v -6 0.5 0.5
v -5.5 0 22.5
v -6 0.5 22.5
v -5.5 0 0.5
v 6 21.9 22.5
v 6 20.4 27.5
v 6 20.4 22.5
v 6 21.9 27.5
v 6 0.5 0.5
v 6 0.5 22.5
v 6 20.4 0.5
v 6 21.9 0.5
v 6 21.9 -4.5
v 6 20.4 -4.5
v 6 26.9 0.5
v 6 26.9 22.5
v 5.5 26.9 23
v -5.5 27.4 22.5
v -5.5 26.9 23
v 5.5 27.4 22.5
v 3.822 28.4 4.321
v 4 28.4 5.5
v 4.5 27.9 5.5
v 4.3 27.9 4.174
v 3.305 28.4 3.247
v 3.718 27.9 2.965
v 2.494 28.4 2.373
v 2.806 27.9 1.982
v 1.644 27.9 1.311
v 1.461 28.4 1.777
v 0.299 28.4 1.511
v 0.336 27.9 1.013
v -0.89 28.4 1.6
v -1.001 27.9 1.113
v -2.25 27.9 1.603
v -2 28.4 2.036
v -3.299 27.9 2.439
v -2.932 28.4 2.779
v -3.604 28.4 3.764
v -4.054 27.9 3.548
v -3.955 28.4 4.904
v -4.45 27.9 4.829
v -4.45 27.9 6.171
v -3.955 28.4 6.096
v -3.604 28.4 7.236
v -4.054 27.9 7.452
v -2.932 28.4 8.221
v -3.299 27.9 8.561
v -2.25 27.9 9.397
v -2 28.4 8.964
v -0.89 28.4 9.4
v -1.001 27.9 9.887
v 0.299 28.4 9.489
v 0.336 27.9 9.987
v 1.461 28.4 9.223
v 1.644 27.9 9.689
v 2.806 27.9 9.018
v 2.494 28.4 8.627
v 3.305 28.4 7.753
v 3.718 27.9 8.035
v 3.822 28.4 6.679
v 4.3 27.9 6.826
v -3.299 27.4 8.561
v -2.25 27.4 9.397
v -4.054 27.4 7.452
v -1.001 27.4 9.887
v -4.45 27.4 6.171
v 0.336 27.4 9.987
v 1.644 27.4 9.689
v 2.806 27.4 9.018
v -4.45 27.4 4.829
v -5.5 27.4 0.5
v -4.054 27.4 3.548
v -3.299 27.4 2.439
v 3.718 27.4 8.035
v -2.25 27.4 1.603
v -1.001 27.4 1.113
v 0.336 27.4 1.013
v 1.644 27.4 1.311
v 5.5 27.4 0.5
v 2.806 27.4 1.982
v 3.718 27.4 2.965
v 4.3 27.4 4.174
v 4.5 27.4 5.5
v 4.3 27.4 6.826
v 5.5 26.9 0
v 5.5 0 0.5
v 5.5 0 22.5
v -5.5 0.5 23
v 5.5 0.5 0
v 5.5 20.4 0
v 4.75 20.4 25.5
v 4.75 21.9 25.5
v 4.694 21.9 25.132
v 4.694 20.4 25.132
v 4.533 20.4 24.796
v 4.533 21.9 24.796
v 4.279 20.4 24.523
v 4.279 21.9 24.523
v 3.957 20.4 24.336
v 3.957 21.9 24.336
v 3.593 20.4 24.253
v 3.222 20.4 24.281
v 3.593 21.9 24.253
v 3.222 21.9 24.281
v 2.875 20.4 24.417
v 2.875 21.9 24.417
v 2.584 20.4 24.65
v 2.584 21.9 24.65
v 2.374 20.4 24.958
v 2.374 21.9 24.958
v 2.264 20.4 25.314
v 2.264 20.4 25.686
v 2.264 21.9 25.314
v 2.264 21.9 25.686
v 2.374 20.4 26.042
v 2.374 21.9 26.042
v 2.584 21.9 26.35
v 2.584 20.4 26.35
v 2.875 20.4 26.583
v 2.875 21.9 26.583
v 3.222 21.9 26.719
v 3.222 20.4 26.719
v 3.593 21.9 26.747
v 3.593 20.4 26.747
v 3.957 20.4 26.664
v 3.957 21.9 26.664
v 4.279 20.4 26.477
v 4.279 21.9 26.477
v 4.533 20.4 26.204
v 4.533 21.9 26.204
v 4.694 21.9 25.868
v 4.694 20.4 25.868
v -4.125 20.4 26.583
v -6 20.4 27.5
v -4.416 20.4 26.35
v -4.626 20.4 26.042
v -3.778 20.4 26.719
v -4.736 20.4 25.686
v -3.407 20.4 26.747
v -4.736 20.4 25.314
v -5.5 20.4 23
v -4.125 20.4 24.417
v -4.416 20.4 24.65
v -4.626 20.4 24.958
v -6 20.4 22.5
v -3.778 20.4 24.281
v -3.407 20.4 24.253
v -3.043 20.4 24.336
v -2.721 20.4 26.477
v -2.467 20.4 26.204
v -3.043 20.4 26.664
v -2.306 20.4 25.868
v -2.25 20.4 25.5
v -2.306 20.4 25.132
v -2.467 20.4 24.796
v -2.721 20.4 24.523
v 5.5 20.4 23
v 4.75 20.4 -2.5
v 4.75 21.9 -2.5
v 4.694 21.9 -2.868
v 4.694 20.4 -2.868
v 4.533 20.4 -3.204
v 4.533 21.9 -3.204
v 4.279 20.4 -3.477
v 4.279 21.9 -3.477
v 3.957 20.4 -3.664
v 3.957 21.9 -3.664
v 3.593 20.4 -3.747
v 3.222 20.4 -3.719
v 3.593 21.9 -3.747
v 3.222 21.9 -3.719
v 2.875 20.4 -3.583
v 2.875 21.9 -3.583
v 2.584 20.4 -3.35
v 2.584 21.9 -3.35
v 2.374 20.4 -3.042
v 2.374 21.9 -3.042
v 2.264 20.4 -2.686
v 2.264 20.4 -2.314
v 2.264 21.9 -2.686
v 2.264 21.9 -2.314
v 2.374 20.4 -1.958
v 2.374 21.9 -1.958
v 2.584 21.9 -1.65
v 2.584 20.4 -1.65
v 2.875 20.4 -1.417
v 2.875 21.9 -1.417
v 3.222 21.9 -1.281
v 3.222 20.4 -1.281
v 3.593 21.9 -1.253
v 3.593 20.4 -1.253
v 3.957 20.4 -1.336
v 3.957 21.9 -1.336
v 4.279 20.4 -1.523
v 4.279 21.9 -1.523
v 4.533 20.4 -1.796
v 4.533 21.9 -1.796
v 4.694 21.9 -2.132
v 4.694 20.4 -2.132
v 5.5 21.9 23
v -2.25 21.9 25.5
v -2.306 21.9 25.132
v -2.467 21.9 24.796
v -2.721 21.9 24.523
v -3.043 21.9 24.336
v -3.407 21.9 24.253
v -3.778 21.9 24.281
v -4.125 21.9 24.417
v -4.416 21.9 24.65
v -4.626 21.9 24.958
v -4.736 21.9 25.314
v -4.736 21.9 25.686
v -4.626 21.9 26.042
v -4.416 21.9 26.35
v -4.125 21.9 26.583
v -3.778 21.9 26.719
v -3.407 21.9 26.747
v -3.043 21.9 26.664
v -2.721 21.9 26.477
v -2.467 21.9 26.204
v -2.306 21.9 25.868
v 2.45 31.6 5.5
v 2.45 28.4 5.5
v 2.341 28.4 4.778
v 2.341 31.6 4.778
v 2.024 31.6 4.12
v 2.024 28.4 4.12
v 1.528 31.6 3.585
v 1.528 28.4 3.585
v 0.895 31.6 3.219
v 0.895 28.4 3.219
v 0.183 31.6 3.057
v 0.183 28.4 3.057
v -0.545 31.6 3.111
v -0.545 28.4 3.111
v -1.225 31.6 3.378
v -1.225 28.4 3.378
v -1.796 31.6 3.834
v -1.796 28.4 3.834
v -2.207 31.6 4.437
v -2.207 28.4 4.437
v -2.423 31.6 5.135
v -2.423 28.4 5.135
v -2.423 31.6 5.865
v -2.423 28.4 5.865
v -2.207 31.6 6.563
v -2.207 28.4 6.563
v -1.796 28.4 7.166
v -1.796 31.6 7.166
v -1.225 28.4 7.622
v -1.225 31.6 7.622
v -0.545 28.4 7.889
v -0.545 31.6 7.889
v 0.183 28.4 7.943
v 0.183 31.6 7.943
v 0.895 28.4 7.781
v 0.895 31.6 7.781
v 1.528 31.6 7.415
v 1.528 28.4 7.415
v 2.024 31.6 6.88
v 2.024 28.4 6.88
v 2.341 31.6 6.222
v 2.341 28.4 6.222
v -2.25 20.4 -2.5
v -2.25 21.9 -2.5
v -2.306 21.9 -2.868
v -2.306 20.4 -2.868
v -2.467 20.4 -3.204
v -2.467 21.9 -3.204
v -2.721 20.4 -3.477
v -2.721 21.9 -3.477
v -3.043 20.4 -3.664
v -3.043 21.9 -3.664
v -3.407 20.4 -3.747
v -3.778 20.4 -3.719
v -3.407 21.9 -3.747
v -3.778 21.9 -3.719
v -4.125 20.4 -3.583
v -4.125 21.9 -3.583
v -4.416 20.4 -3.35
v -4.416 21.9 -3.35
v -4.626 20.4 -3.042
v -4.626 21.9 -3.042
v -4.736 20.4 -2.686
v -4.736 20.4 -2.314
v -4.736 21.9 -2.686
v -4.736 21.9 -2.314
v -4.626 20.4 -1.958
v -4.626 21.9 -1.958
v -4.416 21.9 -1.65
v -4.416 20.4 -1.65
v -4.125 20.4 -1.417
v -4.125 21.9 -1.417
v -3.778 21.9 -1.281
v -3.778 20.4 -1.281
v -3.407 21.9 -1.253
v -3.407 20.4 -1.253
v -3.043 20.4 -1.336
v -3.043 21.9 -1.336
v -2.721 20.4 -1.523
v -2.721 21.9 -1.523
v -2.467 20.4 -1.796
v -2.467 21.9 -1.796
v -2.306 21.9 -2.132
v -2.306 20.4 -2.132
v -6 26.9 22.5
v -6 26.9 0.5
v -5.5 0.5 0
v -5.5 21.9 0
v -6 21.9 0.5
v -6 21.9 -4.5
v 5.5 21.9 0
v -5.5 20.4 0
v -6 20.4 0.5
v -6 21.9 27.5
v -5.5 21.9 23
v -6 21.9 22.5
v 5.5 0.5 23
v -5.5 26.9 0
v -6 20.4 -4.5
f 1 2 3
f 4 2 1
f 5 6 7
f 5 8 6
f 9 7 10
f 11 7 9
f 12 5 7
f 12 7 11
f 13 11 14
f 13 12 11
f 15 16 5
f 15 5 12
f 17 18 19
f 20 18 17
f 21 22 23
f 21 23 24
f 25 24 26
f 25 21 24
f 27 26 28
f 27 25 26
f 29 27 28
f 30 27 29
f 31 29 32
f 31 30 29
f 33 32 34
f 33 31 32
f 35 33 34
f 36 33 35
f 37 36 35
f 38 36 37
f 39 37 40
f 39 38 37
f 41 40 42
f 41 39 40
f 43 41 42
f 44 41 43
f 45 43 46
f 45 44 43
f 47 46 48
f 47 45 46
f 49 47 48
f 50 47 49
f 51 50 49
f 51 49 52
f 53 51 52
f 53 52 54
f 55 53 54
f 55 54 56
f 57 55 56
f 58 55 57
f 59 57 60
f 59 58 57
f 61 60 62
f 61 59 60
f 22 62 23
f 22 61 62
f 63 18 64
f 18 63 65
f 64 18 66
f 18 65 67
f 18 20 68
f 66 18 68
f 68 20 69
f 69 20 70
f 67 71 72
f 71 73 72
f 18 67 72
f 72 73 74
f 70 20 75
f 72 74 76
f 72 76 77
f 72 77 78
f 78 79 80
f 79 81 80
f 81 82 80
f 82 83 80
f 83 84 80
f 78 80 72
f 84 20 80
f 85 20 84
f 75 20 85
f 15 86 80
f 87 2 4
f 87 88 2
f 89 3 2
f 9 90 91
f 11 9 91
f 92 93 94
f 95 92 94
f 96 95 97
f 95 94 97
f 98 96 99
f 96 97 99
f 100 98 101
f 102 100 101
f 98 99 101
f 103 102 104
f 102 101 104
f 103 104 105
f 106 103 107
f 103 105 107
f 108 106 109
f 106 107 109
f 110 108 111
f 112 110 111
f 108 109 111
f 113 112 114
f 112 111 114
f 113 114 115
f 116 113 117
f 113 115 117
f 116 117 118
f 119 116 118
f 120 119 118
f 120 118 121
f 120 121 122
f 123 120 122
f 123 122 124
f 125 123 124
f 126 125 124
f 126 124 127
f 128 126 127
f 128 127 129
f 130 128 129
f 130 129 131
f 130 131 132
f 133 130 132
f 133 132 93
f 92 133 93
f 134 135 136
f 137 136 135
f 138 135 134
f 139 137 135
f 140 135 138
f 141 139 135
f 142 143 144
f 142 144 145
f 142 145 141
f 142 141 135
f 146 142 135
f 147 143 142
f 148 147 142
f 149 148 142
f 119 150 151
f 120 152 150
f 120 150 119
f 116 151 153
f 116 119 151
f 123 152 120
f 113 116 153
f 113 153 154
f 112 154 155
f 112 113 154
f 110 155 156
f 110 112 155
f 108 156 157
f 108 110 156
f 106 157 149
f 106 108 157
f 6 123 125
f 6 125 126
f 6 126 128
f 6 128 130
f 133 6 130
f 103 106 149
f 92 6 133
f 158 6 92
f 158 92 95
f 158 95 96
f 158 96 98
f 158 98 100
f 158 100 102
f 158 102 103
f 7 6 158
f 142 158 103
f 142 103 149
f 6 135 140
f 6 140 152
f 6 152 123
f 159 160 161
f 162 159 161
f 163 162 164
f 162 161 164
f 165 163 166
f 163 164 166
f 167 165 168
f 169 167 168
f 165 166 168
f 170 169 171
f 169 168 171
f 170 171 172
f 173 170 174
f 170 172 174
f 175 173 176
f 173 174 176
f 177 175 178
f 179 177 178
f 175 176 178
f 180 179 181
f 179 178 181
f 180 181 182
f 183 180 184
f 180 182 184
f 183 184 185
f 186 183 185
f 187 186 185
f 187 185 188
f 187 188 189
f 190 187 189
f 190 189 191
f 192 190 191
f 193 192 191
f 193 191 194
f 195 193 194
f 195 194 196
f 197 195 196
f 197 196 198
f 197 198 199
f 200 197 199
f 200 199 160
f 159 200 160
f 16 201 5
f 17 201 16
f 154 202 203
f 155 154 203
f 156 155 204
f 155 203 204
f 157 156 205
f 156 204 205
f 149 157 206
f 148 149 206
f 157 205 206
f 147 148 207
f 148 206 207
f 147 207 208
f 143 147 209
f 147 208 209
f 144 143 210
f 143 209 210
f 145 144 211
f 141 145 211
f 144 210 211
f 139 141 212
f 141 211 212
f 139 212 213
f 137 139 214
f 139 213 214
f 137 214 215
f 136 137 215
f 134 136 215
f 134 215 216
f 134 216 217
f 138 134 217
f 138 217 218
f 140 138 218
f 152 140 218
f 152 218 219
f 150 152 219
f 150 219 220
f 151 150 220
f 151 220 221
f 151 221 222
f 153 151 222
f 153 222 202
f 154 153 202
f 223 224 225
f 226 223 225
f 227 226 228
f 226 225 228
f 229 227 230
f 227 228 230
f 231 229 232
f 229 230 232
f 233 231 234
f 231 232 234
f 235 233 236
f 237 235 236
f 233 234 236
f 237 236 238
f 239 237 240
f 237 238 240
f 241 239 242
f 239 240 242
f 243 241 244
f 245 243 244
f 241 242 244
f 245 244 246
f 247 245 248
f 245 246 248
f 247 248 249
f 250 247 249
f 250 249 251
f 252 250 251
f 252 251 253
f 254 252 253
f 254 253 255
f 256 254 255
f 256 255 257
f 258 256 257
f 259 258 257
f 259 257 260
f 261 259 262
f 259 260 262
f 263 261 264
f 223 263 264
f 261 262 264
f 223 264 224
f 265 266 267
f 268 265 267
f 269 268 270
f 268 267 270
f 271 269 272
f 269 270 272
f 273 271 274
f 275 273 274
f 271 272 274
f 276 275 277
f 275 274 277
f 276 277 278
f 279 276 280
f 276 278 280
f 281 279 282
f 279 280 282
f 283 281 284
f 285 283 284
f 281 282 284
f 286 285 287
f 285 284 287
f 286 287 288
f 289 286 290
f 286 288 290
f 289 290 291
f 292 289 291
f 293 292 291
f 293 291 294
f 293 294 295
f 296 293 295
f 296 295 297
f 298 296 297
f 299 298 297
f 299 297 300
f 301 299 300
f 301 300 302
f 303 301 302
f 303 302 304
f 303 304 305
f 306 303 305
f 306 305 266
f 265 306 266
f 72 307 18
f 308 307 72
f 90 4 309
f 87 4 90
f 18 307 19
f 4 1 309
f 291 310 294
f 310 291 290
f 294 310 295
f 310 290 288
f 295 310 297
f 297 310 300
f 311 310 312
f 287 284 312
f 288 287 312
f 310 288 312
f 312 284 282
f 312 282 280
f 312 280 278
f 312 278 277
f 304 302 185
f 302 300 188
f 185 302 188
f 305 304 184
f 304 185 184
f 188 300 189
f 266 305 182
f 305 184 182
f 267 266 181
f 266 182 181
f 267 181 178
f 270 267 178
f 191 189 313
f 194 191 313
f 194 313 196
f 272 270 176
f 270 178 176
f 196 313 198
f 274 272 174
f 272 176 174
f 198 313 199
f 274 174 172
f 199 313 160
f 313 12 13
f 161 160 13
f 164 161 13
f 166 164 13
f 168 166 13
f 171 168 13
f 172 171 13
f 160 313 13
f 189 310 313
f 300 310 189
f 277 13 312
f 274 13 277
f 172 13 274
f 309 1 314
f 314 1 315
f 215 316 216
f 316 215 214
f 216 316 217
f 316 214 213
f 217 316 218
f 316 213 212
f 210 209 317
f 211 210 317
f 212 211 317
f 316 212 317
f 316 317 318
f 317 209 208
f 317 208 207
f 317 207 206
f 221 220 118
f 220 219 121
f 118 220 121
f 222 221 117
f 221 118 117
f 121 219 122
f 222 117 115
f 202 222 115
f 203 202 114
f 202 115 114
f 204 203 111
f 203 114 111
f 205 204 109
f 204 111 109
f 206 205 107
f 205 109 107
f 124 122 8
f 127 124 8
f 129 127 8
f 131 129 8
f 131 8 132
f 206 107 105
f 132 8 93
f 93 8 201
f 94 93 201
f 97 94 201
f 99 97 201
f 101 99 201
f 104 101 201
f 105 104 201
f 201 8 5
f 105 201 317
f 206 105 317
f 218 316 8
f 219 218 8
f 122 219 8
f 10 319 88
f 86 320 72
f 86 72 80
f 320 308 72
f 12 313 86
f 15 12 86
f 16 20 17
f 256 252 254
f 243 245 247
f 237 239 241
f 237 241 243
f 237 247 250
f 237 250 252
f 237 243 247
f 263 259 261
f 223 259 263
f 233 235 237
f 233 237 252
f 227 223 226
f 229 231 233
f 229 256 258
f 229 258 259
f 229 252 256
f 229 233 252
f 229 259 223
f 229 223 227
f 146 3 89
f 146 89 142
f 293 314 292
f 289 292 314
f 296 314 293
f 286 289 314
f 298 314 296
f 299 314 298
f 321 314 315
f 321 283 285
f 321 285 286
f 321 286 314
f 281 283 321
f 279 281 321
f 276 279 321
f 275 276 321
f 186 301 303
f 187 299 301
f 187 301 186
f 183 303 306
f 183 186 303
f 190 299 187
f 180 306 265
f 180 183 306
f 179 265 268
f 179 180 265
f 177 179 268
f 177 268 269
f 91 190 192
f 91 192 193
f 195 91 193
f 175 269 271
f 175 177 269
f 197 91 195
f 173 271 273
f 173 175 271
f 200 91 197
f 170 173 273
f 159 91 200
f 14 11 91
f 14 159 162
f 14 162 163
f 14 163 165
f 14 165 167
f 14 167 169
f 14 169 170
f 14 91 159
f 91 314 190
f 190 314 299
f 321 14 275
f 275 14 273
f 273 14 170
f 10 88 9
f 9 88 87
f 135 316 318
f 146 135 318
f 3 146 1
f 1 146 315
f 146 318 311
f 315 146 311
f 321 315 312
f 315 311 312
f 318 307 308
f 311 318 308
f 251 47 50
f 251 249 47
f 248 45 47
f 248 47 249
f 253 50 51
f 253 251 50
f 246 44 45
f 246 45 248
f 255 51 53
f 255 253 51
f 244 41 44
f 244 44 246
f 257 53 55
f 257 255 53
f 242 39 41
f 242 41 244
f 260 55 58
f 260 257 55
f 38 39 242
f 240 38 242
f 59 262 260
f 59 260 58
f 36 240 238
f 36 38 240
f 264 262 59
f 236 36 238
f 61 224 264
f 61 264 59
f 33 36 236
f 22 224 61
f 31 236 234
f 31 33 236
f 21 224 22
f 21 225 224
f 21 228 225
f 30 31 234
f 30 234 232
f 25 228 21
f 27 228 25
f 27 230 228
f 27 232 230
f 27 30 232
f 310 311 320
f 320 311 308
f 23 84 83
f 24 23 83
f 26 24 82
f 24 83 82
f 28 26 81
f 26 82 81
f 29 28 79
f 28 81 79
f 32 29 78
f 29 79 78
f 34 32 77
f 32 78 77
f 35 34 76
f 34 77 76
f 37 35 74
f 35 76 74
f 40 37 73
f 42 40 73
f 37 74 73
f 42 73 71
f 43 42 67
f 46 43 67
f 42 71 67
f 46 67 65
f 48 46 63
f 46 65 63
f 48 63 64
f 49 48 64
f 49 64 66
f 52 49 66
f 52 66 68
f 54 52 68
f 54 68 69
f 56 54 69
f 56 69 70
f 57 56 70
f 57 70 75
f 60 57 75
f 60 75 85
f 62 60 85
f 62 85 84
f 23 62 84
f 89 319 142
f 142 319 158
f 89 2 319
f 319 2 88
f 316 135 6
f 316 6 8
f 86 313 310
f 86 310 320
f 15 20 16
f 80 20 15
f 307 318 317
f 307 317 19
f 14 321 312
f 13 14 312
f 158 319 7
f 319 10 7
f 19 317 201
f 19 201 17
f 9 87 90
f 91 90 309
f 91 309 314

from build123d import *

# Parameters (mm, degrees)
SKETCH1_W           = 23
SKETCH1_H           = 27.4
SKETCH1_W_2         = 4.5
SKETCH1_H_2         = 1.5
BOSS_EXTRUDE1_DEPTH = 6
CHAMFER1_SIZE       = 0.5
SKETCH3_R           = 1.25
CUT_EXTRUDE1_DEPTH  = 28.4
BOSS_EXTRUDE2_START = -7
SKETCH3_3_R         = 4.5
BOSS_EXTRUDE2_DEPTH = 8
CHAMFER2_SIZE       = 0.5
BOSS_EXTRUDE3_START = 1
SKETCH3_4_R         = 2.45
BOSS_EXTRUDE3_DEPTH = 3.2


with BuildPart() as part:
    # Sketch1 → Boss-Extrude1 (new body, symmetric)
    with BuildSketch(Plane(origin=(0, 0, 0), x_dir=(0, 0, -1), z_dir=(1, 0, 0))):
        with Locations((-11.5, 13.7)):
            Rectangle(SKETCH1_W, SKETCH1_H)
        with Locations((-25.25, 21.15)):
            Rectangle(SKETCH1_W_2, SKETCH1_H_2)
        with Locations((2.25, 21.15)):
            Rectangle(SKETCH1_W_2, SKETCH1_H_2)
    extrude(amount=BOSS_EXTRUDE1_DEPTH, both=True)

    # Chamfer1
    chamfer1_edges = [part.edges().sort_by_distance(p)[0] for p in [
        (-6, 24.65, 23),
        (-6, 27.4, 11.5),
        (-6, 24.65, 0),
        (-6, 10.2, 0),
        (-6, 0, 11.5),
        (-6, 10.2, 23),
        (6, 10.2, 23),
        (0, 27.4, 23),
        (0, 27.4, 0),
        (0, 0, 0),
        (0, 0, 23),
        (6, 0, 11.5),
        (6, 10.2, 0),
        (6, 24.65, 0),
        (6, 27.4, 11.5),
        (6, 24.65, 23),
    ]]
    chamfer(chamfer1_edges, length=CHAMFER1_SIZE)

    # Sketch3 → Cut-Extrude1 (cut, through all)
    with BuildSketch(Plane(origin=(0, 27.4, 0), x_dir=(1, 0, 0), z_dir=(0, 1, 0))):
        with Locations((-3.5, -25.5)):
            Circle(SKETCH3_R)
        with Locations((3.5, -25.5)):
            Circle(SKETCH3_R)
        with Locations((3.5, 2.5)):
            Circle(SKETCH3_R)
        with Locations((-3.5, 2.5)):
            Circle(SKETCH3_R)
    extrude(amount=-CUT_EXTRUDE1_DEPTH, mode=Mode.SUBTRACT)

    # Sketch3<3> → Boss-Extrude2 (add)
    with BuildSketch(Plane(origin=(0, 27.4, 0), x_dir=(1, 0, 0), z_dir=(0, 1, 0)).offset(BOSS_EXTRUDE2_START)):
        with Locations((0, -5.5)):
            Circle(SKETCH3_3_R)
    extrude(amount=BOSS_EXTRUDE2_DEPTH)

    # Chamfer2
    chamfer2_edges = [part.edges().sort_by_distance(p)[0] for p in [
        (-4.5, 28.4, 5.5),
    ]]
    chamfer(chamfer2_edges, length=CHAMFER2_SIZE)

    # Sketch3<4> → Boss-Extrude3 (add)
    with BuildSketch(Plane(origin=(0, 27.4, 0), x_dir=(1, 0, 0), z_dir=(0, 1, 0)).offset(BOSS_EXTRUDE3_START)):
        with Locations((0, -5.5)):
            Circle(SKETCH3_4_R)
    extrude(amount=BOSS_EXTRUDE3_DEPTH)


solid = part.part
